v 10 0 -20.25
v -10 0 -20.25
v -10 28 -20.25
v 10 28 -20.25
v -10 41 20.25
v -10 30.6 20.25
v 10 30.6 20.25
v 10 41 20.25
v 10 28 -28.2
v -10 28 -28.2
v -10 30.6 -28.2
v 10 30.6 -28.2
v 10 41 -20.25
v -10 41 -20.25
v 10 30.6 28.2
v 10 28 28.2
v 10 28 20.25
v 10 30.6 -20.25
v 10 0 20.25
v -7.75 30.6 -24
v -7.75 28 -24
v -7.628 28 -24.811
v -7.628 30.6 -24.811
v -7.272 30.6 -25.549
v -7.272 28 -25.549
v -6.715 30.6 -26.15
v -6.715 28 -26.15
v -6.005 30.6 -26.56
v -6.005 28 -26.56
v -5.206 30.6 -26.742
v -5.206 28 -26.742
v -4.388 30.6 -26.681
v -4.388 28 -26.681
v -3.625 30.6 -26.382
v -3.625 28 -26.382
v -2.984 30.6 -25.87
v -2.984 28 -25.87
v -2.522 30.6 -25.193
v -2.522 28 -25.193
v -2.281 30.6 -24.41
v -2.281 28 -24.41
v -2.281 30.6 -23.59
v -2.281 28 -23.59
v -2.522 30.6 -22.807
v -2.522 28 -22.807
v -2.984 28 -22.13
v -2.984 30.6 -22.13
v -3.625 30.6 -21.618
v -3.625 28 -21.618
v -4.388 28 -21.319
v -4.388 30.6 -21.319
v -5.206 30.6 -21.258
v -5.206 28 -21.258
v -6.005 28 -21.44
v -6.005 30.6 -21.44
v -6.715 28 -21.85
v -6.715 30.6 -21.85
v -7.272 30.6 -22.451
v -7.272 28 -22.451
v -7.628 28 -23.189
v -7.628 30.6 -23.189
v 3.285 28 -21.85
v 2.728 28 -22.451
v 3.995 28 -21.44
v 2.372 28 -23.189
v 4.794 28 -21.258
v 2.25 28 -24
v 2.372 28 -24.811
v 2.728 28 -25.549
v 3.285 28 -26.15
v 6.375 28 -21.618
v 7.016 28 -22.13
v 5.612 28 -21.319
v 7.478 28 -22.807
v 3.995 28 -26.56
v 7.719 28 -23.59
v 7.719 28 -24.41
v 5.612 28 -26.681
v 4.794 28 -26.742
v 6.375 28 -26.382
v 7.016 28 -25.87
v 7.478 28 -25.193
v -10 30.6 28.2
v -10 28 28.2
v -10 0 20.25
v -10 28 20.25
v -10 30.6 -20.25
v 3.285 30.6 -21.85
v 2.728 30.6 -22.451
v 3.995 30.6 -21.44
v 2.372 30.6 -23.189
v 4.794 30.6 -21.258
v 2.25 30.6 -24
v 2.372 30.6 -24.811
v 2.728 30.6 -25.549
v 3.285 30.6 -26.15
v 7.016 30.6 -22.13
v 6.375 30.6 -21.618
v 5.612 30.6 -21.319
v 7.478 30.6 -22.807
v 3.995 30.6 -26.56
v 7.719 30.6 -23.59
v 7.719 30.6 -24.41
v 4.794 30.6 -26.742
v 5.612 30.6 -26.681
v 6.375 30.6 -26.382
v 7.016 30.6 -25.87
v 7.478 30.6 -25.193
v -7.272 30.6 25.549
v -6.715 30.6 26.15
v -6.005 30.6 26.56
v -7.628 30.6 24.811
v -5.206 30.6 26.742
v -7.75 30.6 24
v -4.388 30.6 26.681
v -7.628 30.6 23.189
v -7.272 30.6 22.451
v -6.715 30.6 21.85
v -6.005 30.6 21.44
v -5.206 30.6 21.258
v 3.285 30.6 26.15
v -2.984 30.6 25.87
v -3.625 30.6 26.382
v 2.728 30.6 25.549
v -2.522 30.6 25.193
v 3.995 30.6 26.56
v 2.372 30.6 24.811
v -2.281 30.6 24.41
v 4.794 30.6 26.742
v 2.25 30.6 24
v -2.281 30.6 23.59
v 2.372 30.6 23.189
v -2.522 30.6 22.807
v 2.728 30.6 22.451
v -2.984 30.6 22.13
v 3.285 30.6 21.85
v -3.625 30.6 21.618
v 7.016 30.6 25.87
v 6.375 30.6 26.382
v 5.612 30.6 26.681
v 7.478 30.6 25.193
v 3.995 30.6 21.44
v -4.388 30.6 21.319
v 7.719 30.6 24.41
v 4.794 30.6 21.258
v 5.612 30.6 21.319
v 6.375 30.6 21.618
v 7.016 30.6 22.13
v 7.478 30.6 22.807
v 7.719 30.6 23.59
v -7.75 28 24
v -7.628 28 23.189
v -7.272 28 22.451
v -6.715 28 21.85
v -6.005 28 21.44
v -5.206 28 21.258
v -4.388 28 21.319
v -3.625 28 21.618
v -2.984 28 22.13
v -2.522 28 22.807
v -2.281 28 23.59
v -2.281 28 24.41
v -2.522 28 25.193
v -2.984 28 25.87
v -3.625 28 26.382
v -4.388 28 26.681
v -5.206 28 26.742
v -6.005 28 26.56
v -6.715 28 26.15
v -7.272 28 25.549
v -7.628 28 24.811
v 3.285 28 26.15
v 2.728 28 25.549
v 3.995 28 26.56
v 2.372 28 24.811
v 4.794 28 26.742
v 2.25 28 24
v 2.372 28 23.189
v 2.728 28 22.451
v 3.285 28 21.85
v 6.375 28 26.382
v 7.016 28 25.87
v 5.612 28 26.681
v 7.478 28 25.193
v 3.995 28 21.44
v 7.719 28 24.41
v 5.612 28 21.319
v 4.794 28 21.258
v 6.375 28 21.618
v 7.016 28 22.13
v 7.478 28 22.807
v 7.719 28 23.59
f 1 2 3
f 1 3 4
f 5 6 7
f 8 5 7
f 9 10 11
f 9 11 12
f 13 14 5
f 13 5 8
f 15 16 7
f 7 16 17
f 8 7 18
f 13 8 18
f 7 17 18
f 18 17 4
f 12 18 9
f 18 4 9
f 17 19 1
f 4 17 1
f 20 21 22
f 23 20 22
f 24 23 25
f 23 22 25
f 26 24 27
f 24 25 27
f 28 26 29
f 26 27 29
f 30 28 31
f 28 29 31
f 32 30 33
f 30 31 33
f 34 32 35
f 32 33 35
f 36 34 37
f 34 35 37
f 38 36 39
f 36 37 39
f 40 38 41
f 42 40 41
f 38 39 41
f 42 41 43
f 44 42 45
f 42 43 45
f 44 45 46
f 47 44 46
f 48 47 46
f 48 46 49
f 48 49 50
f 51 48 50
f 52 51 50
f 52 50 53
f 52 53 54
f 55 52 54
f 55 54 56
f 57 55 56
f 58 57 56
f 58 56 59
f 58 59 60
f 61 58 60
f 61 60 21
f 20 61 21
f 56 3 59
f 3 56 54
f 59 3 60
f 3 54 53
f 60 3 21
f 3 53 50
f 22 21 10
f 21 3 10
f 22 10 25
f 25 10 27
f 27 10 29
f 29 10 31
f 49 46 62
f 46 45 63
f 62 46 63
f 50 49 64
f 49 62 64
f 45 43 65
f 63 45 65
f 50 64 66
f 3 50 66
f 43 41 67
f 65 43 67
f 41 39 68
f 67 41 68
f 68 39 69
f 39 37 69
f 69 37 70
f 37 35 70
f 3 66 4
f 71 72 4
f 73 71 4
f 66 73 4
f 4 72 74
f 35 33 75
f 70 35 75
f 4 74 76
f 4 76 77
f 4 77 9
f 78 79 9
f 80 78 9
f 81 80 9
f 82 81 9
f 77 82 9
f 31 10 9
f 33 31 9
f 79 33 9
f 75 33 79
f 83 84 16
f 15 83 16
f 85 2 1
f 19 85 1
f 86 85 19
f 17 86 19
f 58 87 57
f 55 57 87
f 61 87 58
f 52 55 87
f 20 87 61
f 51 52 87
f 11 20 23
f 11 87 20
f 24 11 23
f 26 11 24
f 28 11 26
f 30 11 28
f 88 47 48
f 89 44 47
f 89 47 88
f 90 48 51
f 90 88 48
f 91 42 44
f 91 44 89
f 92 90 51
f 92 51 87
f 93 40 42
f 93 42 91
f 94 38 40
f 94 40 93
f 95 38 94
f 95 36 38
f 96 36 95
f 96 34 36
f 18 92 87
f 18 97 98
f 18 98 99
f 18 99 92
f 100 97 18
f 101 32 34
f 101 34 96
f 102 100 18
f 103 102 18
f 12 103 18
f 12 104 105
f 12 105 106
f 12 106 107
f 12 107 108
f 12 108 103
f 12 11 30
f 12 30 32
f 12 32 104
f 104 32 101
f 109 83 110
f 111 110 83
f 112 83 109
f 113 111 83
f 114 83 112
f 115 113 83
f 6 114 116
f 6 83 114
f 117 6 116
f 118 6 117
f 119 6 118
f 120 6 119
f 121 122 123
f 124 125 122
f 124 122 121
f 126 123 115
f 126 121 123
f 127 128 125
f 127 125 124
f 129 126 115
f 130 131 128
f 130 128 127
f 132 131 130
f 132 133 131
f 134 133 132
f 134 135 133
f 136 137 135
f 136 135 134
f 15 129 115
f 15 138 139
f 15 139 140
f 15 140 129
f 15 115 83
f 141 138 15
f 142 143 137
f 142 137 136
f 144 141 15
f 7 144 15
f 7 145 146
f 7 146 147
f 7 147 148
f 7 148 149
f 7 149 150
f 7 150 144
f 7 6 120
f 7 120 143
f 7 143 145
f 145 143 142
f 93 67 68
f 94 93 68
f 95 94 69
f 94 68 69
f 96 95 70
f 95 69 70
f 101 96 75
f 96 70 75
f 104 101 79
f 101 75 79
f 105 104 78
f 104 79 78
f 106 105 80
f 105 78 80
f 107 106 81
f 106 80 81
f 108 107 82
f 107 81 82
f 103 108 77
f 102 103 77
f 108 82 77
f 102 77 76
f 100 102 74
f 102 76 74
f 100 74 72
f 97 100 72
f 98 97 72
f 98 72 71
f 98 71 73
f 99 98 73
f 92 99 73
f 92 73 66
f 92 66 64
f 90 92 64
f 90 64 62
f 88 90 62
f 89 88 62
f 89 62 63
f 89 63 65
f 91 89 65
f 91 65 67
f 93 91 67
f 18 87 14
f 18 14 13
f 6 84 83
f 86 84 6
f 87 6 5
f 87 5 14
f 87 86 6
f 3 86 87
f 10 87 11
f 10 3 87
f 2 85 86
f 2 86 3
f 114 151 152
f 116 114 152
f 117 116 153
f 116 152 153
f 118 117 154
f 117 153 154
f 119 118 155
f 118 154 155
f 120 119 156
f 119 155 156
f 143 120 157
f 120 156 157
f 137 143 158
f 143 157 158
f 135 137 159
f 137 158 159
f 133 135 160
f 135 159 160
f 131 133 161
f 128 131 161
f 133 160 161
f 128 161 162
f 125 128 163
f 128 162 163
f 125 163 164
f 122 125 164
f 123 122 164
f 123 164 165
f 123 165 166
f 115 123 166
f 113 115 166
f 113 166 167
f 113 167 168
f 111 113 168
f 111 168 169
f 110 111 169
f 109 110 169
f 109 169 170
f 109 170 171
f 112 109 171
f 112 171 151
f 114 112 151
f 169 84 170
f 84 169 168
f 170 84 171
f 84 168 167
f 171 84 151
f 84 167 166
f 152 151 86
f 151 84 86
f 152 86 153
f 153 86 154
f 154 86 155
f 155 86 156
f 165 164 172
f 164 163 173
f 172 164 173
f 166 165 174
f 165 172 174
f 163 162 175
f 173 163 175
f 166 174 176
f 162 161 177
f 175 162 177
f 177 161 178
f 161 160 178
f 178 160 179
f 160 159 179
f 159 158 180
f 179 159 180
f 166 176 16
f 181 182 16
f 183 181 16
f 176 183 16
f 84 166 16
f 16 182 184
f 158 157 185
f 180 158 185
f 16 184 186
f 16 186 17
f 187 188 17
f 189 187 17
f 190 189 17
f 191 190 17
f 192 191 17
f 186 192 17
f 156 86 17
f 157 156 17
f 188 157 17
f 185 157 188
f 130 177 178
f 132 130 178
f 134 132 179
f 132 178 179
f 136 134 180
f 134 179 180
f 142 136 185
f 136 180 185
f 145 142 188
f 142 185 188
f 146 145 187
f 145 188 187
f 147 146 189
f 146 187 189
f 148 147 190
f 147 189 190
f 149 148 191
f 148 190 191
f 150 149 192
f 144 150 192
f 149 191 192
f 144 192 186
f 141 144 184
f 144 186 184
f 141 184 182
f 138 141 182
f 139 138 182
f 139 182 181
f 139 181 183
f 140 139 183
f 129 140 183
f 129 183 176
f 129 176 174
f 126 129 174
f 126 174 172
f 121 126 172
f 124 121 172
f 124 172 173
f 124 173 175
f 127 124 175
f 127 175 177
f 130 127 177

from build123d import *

# Parameters (mm, degrees)
SKETCH2_W            = 20
SKETCH2_H            = 40.5
BOSS_EXTRUDE1_DEPTH  = 41
SKETCH3_W            = 20
SKETCH3_H            = 56.4
BOSS_EXTRUDE2_DEPTH  = 2.6
M5_CLEARANCE_HOLE1_D = 5.5


with BuildPart() as part:
    # Sketch2 → Boss-Extrude1 (new body)
    with BuildSketch(Plane(origin=(0, 0, 0), x_dir=(1, 0, 0), z_dir=(0, 1, 0))):
        Rectangle(SKETCH2_W, SKETCH2_H)
    extrude(amount=BOSS_EXTRUDE1_DEPTH)

    # Sketch3 → Boss-Extrude2 (add)
    with BuildSketch(Plane(origin=(0, 28, 0), x_dir=(1, 0, 0), z_dir=(0, 1, 0))):
        Rectangle(SKETCH3_W, SKETCH3_H)
    extrude(amount=BOSS_EXTRUDE2_DEPTH)

    # M5 Clearance Hole1 (through all)
    with Locations(Plane(origin=(0, 30.6, 0), x_dir=(1, 0, 0), z_dir=(0, 1, 0))):
        with Locations((-5, 24), (5, 24), (5, -24), (-5, -24)):
            Hole(M5_CLEARANCE_HOLE1_D / 2)


solid = part.part
